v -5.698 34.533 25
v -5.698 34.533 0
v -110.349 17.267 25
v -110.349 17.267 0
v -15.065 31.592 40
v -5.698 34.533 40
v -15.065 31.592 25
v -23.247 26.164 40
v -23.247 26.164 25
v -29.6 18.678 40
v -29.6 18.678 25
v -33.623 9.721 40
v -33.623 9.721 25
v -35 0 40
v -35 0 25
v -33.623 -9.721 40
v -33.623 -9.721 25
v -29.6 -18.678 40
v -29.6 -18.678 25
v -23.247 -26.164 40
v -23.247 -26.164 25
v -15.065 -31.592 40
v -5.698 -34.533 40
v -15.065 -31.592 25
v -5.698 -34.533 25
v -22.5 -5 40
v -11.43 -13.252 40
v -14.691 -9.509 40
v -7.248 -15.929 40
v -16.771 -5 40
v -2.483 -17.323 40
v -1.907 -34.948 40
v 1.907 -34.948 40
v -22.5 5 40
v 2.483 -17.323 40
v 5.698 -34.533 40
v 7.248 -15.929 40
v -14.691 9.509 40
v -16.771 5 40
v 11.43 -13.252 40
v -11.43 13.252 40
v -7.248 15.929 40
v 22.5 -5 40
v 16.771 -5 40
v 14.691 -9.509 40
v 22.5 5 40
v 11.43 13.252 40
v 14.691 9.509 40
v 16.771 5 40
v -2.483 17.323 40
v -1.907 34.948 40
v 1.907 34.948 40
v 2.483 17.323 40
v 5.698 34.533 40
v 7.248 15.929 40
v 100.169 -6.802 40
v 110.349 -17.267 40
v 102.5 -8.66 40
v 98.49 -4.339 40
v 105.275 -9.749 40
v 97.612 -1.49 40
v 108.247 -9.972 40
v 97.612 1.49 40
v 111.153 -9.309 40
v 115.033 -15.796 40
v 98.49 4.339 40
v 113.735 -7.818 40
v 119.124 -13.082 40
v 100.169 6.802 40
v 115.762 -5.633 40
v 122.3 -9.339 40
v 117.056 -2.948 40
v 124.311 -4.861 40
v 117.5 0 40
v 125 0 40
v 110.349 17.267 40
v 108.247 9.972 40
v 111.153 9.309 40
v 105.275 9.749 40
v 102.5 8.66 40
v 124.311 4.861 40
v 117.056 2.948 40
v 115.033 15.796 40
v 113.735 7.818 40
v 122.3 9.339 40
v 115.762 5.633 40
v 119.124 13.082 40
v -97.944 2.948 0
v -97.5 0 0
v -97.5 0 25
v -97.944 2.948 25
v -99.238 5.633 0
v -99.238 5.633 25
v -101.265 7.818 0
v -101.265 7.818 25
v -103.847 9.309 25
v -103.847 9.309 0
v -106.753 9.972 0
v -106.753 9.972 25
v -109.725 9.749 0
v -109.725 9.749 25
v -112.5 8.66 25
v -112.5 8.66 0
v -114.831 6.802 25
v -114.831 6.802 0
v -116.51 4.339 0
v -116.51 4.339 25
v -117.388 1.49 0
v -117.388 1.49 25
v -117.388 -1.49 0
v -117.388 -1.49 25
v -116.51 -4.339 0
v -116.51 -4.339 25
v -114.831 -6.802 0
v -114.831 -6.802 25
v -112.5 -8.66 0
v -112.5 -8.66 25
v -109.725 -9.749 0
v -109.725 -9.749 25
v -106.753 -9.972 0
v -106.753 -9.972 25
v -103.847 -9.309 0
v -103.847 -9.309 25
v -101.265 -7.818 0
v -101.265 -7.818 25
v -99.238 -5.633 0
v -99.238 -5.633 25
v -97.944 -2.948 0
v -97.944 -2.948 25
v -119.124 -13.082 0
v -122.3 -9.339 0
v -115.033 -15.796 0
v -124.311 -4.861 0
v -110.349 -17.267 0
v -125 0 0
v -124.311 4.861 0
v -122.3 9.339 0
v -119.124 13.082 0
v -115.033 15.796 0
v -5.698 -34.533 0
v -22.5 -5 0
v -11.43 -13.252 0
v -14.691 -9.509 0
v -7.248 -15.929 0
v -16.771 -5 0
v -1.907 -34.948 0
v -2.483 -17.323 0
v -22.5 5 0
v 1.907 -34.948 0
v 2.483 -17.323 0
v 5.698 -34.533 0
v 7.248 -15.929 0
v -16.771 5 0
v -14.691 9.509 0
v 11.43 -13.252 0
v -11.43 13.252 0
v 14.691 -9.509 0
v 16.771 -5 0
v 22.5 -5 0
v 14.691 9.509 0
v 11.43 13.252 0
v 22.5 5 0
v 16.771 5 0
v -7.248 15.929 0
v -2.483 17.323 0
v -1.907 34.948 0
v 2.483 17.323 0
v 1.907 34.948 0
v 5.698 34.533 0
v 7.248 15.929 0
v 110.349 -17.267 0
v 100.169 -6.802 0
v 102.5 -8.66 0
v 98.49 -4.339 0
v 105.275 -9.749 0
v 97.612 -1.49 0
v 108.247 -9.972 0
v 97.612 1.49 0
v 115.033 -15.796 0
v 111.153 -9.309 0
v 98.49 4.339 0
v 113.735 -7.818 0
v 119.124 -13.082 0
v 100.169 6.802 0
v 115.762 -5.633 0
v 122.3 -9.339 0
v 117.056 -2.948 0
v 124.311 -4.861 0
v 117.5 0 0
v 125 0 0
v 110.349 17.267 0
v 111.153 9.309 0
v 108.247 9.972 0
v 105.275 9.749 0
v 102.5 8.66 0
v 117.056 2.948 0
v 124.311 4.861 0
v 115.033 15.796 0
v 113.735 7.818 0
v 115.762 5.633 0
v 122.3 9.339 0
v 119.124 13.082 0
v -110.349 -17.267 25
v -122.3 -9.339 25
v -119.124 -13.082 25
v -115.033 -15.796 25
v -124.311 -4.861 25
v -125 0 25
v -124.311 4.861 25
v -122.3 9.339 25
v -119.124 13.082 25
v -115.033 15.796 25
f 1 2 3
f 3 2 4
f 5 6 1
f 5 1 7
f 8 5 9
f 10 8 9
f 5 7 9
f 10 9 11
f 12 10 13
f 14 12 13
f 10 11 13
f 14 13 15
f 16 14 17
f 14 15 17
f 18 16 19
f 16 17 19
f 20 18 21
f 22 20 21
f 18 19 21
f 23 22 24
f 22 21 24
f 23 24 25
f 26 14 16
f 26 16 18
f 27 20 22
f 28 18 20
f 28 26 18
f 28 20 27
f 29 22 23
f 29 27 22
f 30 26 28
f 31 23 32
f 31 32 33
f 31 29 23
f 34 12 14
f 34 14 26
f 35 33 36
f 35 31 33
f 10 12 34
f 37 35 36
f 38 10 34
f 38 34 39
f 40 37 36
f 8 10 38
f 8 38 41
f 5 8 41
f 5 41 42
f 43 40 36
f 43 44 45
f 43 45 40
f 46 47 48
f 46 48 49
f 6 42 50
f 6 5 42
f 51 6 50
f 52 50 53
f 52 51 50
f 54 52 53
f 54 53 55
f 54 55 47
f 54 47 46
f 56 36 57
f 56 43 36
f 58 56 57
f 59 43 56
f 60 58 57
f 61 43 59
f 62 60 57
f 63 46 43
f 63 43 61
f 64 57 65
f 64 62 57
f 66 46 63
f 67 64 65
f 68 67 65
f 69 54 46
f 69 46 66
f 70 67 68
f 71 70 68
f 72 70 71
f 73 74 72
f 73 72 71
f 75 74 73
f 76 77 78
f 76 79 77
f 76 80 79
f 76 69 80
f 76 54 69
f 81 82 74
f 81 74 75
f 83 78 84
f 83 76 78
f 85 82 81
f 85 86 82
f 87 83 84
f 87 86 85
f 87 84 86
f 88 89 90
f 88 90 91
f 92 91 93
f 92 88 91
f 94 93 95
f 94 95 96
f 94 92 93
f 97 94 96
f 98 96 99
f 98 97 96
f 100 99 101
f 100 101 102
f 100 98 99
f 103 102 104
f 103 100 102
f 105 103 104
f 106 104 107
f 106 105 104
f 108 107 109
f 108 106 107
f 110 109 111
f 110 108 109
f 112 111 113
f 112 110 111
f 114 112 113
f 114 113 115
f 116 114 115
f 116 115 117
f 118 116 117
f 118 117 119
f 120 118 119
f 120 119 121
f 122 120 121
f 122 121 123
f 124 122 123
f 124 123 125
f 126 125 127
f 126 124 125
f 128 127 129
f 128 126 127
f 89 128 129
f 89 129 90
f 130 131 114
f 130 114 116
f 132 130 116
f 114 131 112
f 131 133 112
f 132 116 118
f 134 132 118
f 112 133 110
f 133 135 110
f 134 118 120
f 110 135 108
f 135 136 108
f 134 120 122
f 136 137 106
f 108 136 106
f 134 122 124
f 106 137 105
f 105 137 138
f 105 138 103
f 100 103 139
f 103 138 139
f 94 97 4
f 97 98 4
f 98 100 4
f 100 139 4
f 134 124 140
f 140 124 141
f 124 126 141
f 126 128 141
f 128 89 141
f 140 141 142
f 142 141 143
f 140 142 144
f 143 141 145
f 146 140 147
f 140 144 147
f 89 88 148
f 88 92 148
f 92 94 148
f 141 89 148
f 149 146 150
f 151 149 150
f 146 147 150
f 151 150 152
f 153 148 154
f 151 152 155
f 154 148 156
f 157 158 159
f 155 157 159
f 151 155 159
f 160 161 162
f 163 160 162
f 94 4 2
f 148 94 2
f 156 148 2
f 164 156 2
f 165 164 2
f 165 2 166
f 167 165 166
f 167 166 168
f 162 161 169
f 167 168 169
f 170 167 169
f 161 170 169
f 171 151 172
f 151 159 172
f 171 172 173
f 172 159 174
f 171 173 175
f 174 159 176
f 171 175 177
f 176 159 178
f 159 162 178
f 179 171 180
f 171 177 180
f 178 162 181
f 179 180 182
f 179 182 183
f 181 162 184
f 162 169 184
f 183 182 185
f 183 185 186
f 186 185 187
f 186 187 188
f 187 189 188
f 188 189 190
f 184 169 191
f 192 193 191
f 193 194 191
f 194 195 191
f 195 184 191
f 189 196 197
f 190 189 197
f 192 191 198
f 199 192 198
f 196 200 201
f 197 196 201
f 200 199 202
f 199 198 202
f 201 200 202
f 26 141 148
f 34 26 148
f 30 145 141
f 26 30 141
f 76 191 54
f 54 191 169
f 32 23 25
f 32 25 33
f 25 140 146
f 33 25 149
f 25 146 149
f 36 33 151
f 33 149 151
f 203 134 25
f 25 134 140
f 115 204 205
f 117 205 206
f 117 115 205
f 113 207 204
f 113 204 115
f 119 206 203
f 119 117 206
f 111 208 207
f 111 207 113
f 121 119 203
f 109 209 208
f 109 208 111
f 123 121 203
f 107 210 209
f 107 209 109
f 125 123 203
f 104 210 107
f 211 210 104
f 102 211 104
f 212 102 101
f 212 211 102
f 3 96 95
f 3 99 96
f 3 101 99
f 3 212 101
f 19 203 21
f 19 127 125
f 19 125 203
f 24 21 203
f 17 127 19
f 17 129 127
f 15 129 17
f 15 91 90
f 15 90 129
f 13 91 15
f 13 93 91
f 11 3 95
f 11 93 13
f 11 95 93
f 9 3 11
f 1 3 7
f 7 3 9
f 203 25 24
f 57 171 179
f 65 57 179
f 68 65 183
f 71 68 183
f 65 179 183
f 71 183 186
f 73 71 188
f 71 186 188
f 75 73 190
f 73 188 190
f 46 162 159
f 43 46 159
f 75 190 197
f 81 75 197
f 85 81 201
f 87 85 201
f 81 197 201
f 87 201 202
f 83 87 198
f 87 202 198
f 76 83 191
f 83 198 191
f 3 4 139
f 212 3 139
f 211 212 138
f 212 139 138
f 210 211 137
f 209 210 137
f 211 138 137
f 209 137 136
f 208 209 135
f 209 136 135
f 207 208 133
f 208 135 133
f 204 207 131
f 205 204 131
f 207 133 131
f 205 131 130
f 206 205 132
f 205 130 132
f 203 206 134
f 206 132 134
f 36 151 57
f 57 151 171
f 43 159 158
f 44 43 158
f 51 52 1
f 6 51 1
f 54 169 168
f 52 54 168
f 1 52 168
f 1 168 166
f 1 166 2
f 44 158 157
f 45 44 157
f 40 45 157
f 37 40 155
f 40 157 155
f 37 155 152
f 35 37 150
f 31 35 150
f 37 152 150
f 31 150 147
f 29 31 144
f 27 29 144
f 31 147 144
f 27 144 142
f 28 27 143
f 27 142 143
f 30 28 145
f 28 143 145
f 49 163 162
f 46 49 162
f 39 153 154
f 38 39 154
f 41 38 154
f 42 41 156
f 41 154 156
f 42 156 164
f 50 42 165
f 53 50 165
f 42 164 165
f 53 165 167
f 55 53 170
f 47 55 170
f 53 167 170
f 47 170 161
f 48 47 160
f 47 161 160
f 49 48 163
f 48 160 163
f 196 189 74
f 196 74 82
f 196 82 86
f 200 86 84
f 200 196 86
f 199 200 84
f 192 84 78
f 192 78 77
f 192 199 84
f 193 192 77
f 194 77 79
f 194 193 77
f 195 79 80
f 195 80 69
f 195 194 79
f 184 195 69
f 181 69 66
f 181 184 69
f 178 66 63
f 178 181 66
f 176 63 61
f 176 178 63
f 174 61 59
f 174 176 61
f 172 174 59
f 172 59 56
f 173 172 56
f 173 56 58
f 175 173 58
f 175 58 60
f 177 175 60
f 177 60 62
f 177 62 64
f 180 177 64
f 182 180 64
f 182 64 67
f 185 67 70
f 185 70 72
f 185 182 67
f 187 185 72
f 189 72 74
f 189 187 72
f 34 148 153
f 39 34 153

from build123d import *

# Parameters (mm, degrees)
F0_R     = 10
F1_DEPTH = 40
F2_DEPTH = 25


with BuildPart() as f1:
    # F0 (on Top) → F1 (new body)
    with BuildSketch(Plane.XY):
        with BuildLine():
            ThreePointArc((5.697674, 34.533122), (26.68725, 22.644882), (35, 0))
            ThreePointArc((35, 0), (26.68725, -22.644882), (5.697674, -34.533122))
            Line((5.697674, -34.533122), (110.348837, -17.266561))
            ThreePointArc((110.348837, -17.266561), (90, 0), (110.348837, 17.266561))
            Line((110.348837, 17.266561), (5.697674, 34.533122))
        make_face()
        with BuildLine():
            ThreePointArc((125, 0), (120.843625, 11.322441), (110.348837, 17.266561))
            ThreePointArc((110.348837, 17.266561), (90, 0), (110.348837, -17.266561))
            ThreePointArc((110.348837, -17.266561), (120.843625, -11.322441), (125, 0))
        make_face()
        with Locations((107.5, 0)):
            Circle(F0_R, mode=Mode.SUBTRACT)
        with BuildLine():
            ThreePointArc((5.697674, -34.533122), (26.68725, -22.644882), (35, 0))
            ThreePointArc((35, 0), (26.68725, 22.644882), (5.697674, 34.533122))
            ThreePointArc((5.697674, 34.533122), (0, 35), (-5.697674, 34.533122))
            ThreePointArc((-5.697674, 34.533122), (-35, 0), (-5.697674, -34.533122))
            ThreePointArc((-5.697674, -34.533122), (0, -35), (5.697674, -34.533122))
        make_face()
        with BuildLine():
            ThreePointArc((-16.77051, 5), (0, 17.5), (16.77051, 5))
            Line((16.77051, 5), (22.5, 5))
            Line((22.5, 5), (22.5, -5))
            Line((22.5, -5), (16.77051, -5))
            ThreePointArc((16.77051, -5), (0, -17.5), (-16.77051, -5))
            Line((-16.77051, -5), (-22.5, -5))
            Line((-22.5, -5), (-22.5, 5))
            Line((-22.5, 5), (-16.77051, 5))
        make_face(mode=Mode.SUBTRACT)
    extrude(amount=F1_DEPTH)

    # F0 (on Top) → F2 (join)
    with BuildSketch(Plane.XY):
        with BuildLine():
            ThreePointArc((-5.697674, -34.533122), (-35, 0), (-5.697674, 34.533122))
            Line((-5.697674, 34.533122), (-110.348837, 17.266561))
            ThreePointArc((-110.348837, 17.266561), (-96.177559, 13.343625), (-90, 0))
            ThreePointArc((-90, 0), (-96.177559, -13.343625), (-110.348837, -17.266561))
            Line((-110.348837, -17.266561), (-5.697674, -34.533122))
        make_face()
        with BuildLine():
            ThreePointArc((-90, 0), (-96.177559, 13.343625), (-110.348837, 17.266561))
            ThreePointArc((-110.348837, 17.266561), (-125, 0), (-110.348837, -17.266561))
            ThreePointArc((-110.348837, -17.266561), (-96.177559, -13.343625), (-90, 0))
        make_face()
        with Locations((-107.5, 0)):
            Circle(F0_R, mode=Mode.SUBTRACT)
    extrude(amount=F2_DEPTH)


solid = f1.part
